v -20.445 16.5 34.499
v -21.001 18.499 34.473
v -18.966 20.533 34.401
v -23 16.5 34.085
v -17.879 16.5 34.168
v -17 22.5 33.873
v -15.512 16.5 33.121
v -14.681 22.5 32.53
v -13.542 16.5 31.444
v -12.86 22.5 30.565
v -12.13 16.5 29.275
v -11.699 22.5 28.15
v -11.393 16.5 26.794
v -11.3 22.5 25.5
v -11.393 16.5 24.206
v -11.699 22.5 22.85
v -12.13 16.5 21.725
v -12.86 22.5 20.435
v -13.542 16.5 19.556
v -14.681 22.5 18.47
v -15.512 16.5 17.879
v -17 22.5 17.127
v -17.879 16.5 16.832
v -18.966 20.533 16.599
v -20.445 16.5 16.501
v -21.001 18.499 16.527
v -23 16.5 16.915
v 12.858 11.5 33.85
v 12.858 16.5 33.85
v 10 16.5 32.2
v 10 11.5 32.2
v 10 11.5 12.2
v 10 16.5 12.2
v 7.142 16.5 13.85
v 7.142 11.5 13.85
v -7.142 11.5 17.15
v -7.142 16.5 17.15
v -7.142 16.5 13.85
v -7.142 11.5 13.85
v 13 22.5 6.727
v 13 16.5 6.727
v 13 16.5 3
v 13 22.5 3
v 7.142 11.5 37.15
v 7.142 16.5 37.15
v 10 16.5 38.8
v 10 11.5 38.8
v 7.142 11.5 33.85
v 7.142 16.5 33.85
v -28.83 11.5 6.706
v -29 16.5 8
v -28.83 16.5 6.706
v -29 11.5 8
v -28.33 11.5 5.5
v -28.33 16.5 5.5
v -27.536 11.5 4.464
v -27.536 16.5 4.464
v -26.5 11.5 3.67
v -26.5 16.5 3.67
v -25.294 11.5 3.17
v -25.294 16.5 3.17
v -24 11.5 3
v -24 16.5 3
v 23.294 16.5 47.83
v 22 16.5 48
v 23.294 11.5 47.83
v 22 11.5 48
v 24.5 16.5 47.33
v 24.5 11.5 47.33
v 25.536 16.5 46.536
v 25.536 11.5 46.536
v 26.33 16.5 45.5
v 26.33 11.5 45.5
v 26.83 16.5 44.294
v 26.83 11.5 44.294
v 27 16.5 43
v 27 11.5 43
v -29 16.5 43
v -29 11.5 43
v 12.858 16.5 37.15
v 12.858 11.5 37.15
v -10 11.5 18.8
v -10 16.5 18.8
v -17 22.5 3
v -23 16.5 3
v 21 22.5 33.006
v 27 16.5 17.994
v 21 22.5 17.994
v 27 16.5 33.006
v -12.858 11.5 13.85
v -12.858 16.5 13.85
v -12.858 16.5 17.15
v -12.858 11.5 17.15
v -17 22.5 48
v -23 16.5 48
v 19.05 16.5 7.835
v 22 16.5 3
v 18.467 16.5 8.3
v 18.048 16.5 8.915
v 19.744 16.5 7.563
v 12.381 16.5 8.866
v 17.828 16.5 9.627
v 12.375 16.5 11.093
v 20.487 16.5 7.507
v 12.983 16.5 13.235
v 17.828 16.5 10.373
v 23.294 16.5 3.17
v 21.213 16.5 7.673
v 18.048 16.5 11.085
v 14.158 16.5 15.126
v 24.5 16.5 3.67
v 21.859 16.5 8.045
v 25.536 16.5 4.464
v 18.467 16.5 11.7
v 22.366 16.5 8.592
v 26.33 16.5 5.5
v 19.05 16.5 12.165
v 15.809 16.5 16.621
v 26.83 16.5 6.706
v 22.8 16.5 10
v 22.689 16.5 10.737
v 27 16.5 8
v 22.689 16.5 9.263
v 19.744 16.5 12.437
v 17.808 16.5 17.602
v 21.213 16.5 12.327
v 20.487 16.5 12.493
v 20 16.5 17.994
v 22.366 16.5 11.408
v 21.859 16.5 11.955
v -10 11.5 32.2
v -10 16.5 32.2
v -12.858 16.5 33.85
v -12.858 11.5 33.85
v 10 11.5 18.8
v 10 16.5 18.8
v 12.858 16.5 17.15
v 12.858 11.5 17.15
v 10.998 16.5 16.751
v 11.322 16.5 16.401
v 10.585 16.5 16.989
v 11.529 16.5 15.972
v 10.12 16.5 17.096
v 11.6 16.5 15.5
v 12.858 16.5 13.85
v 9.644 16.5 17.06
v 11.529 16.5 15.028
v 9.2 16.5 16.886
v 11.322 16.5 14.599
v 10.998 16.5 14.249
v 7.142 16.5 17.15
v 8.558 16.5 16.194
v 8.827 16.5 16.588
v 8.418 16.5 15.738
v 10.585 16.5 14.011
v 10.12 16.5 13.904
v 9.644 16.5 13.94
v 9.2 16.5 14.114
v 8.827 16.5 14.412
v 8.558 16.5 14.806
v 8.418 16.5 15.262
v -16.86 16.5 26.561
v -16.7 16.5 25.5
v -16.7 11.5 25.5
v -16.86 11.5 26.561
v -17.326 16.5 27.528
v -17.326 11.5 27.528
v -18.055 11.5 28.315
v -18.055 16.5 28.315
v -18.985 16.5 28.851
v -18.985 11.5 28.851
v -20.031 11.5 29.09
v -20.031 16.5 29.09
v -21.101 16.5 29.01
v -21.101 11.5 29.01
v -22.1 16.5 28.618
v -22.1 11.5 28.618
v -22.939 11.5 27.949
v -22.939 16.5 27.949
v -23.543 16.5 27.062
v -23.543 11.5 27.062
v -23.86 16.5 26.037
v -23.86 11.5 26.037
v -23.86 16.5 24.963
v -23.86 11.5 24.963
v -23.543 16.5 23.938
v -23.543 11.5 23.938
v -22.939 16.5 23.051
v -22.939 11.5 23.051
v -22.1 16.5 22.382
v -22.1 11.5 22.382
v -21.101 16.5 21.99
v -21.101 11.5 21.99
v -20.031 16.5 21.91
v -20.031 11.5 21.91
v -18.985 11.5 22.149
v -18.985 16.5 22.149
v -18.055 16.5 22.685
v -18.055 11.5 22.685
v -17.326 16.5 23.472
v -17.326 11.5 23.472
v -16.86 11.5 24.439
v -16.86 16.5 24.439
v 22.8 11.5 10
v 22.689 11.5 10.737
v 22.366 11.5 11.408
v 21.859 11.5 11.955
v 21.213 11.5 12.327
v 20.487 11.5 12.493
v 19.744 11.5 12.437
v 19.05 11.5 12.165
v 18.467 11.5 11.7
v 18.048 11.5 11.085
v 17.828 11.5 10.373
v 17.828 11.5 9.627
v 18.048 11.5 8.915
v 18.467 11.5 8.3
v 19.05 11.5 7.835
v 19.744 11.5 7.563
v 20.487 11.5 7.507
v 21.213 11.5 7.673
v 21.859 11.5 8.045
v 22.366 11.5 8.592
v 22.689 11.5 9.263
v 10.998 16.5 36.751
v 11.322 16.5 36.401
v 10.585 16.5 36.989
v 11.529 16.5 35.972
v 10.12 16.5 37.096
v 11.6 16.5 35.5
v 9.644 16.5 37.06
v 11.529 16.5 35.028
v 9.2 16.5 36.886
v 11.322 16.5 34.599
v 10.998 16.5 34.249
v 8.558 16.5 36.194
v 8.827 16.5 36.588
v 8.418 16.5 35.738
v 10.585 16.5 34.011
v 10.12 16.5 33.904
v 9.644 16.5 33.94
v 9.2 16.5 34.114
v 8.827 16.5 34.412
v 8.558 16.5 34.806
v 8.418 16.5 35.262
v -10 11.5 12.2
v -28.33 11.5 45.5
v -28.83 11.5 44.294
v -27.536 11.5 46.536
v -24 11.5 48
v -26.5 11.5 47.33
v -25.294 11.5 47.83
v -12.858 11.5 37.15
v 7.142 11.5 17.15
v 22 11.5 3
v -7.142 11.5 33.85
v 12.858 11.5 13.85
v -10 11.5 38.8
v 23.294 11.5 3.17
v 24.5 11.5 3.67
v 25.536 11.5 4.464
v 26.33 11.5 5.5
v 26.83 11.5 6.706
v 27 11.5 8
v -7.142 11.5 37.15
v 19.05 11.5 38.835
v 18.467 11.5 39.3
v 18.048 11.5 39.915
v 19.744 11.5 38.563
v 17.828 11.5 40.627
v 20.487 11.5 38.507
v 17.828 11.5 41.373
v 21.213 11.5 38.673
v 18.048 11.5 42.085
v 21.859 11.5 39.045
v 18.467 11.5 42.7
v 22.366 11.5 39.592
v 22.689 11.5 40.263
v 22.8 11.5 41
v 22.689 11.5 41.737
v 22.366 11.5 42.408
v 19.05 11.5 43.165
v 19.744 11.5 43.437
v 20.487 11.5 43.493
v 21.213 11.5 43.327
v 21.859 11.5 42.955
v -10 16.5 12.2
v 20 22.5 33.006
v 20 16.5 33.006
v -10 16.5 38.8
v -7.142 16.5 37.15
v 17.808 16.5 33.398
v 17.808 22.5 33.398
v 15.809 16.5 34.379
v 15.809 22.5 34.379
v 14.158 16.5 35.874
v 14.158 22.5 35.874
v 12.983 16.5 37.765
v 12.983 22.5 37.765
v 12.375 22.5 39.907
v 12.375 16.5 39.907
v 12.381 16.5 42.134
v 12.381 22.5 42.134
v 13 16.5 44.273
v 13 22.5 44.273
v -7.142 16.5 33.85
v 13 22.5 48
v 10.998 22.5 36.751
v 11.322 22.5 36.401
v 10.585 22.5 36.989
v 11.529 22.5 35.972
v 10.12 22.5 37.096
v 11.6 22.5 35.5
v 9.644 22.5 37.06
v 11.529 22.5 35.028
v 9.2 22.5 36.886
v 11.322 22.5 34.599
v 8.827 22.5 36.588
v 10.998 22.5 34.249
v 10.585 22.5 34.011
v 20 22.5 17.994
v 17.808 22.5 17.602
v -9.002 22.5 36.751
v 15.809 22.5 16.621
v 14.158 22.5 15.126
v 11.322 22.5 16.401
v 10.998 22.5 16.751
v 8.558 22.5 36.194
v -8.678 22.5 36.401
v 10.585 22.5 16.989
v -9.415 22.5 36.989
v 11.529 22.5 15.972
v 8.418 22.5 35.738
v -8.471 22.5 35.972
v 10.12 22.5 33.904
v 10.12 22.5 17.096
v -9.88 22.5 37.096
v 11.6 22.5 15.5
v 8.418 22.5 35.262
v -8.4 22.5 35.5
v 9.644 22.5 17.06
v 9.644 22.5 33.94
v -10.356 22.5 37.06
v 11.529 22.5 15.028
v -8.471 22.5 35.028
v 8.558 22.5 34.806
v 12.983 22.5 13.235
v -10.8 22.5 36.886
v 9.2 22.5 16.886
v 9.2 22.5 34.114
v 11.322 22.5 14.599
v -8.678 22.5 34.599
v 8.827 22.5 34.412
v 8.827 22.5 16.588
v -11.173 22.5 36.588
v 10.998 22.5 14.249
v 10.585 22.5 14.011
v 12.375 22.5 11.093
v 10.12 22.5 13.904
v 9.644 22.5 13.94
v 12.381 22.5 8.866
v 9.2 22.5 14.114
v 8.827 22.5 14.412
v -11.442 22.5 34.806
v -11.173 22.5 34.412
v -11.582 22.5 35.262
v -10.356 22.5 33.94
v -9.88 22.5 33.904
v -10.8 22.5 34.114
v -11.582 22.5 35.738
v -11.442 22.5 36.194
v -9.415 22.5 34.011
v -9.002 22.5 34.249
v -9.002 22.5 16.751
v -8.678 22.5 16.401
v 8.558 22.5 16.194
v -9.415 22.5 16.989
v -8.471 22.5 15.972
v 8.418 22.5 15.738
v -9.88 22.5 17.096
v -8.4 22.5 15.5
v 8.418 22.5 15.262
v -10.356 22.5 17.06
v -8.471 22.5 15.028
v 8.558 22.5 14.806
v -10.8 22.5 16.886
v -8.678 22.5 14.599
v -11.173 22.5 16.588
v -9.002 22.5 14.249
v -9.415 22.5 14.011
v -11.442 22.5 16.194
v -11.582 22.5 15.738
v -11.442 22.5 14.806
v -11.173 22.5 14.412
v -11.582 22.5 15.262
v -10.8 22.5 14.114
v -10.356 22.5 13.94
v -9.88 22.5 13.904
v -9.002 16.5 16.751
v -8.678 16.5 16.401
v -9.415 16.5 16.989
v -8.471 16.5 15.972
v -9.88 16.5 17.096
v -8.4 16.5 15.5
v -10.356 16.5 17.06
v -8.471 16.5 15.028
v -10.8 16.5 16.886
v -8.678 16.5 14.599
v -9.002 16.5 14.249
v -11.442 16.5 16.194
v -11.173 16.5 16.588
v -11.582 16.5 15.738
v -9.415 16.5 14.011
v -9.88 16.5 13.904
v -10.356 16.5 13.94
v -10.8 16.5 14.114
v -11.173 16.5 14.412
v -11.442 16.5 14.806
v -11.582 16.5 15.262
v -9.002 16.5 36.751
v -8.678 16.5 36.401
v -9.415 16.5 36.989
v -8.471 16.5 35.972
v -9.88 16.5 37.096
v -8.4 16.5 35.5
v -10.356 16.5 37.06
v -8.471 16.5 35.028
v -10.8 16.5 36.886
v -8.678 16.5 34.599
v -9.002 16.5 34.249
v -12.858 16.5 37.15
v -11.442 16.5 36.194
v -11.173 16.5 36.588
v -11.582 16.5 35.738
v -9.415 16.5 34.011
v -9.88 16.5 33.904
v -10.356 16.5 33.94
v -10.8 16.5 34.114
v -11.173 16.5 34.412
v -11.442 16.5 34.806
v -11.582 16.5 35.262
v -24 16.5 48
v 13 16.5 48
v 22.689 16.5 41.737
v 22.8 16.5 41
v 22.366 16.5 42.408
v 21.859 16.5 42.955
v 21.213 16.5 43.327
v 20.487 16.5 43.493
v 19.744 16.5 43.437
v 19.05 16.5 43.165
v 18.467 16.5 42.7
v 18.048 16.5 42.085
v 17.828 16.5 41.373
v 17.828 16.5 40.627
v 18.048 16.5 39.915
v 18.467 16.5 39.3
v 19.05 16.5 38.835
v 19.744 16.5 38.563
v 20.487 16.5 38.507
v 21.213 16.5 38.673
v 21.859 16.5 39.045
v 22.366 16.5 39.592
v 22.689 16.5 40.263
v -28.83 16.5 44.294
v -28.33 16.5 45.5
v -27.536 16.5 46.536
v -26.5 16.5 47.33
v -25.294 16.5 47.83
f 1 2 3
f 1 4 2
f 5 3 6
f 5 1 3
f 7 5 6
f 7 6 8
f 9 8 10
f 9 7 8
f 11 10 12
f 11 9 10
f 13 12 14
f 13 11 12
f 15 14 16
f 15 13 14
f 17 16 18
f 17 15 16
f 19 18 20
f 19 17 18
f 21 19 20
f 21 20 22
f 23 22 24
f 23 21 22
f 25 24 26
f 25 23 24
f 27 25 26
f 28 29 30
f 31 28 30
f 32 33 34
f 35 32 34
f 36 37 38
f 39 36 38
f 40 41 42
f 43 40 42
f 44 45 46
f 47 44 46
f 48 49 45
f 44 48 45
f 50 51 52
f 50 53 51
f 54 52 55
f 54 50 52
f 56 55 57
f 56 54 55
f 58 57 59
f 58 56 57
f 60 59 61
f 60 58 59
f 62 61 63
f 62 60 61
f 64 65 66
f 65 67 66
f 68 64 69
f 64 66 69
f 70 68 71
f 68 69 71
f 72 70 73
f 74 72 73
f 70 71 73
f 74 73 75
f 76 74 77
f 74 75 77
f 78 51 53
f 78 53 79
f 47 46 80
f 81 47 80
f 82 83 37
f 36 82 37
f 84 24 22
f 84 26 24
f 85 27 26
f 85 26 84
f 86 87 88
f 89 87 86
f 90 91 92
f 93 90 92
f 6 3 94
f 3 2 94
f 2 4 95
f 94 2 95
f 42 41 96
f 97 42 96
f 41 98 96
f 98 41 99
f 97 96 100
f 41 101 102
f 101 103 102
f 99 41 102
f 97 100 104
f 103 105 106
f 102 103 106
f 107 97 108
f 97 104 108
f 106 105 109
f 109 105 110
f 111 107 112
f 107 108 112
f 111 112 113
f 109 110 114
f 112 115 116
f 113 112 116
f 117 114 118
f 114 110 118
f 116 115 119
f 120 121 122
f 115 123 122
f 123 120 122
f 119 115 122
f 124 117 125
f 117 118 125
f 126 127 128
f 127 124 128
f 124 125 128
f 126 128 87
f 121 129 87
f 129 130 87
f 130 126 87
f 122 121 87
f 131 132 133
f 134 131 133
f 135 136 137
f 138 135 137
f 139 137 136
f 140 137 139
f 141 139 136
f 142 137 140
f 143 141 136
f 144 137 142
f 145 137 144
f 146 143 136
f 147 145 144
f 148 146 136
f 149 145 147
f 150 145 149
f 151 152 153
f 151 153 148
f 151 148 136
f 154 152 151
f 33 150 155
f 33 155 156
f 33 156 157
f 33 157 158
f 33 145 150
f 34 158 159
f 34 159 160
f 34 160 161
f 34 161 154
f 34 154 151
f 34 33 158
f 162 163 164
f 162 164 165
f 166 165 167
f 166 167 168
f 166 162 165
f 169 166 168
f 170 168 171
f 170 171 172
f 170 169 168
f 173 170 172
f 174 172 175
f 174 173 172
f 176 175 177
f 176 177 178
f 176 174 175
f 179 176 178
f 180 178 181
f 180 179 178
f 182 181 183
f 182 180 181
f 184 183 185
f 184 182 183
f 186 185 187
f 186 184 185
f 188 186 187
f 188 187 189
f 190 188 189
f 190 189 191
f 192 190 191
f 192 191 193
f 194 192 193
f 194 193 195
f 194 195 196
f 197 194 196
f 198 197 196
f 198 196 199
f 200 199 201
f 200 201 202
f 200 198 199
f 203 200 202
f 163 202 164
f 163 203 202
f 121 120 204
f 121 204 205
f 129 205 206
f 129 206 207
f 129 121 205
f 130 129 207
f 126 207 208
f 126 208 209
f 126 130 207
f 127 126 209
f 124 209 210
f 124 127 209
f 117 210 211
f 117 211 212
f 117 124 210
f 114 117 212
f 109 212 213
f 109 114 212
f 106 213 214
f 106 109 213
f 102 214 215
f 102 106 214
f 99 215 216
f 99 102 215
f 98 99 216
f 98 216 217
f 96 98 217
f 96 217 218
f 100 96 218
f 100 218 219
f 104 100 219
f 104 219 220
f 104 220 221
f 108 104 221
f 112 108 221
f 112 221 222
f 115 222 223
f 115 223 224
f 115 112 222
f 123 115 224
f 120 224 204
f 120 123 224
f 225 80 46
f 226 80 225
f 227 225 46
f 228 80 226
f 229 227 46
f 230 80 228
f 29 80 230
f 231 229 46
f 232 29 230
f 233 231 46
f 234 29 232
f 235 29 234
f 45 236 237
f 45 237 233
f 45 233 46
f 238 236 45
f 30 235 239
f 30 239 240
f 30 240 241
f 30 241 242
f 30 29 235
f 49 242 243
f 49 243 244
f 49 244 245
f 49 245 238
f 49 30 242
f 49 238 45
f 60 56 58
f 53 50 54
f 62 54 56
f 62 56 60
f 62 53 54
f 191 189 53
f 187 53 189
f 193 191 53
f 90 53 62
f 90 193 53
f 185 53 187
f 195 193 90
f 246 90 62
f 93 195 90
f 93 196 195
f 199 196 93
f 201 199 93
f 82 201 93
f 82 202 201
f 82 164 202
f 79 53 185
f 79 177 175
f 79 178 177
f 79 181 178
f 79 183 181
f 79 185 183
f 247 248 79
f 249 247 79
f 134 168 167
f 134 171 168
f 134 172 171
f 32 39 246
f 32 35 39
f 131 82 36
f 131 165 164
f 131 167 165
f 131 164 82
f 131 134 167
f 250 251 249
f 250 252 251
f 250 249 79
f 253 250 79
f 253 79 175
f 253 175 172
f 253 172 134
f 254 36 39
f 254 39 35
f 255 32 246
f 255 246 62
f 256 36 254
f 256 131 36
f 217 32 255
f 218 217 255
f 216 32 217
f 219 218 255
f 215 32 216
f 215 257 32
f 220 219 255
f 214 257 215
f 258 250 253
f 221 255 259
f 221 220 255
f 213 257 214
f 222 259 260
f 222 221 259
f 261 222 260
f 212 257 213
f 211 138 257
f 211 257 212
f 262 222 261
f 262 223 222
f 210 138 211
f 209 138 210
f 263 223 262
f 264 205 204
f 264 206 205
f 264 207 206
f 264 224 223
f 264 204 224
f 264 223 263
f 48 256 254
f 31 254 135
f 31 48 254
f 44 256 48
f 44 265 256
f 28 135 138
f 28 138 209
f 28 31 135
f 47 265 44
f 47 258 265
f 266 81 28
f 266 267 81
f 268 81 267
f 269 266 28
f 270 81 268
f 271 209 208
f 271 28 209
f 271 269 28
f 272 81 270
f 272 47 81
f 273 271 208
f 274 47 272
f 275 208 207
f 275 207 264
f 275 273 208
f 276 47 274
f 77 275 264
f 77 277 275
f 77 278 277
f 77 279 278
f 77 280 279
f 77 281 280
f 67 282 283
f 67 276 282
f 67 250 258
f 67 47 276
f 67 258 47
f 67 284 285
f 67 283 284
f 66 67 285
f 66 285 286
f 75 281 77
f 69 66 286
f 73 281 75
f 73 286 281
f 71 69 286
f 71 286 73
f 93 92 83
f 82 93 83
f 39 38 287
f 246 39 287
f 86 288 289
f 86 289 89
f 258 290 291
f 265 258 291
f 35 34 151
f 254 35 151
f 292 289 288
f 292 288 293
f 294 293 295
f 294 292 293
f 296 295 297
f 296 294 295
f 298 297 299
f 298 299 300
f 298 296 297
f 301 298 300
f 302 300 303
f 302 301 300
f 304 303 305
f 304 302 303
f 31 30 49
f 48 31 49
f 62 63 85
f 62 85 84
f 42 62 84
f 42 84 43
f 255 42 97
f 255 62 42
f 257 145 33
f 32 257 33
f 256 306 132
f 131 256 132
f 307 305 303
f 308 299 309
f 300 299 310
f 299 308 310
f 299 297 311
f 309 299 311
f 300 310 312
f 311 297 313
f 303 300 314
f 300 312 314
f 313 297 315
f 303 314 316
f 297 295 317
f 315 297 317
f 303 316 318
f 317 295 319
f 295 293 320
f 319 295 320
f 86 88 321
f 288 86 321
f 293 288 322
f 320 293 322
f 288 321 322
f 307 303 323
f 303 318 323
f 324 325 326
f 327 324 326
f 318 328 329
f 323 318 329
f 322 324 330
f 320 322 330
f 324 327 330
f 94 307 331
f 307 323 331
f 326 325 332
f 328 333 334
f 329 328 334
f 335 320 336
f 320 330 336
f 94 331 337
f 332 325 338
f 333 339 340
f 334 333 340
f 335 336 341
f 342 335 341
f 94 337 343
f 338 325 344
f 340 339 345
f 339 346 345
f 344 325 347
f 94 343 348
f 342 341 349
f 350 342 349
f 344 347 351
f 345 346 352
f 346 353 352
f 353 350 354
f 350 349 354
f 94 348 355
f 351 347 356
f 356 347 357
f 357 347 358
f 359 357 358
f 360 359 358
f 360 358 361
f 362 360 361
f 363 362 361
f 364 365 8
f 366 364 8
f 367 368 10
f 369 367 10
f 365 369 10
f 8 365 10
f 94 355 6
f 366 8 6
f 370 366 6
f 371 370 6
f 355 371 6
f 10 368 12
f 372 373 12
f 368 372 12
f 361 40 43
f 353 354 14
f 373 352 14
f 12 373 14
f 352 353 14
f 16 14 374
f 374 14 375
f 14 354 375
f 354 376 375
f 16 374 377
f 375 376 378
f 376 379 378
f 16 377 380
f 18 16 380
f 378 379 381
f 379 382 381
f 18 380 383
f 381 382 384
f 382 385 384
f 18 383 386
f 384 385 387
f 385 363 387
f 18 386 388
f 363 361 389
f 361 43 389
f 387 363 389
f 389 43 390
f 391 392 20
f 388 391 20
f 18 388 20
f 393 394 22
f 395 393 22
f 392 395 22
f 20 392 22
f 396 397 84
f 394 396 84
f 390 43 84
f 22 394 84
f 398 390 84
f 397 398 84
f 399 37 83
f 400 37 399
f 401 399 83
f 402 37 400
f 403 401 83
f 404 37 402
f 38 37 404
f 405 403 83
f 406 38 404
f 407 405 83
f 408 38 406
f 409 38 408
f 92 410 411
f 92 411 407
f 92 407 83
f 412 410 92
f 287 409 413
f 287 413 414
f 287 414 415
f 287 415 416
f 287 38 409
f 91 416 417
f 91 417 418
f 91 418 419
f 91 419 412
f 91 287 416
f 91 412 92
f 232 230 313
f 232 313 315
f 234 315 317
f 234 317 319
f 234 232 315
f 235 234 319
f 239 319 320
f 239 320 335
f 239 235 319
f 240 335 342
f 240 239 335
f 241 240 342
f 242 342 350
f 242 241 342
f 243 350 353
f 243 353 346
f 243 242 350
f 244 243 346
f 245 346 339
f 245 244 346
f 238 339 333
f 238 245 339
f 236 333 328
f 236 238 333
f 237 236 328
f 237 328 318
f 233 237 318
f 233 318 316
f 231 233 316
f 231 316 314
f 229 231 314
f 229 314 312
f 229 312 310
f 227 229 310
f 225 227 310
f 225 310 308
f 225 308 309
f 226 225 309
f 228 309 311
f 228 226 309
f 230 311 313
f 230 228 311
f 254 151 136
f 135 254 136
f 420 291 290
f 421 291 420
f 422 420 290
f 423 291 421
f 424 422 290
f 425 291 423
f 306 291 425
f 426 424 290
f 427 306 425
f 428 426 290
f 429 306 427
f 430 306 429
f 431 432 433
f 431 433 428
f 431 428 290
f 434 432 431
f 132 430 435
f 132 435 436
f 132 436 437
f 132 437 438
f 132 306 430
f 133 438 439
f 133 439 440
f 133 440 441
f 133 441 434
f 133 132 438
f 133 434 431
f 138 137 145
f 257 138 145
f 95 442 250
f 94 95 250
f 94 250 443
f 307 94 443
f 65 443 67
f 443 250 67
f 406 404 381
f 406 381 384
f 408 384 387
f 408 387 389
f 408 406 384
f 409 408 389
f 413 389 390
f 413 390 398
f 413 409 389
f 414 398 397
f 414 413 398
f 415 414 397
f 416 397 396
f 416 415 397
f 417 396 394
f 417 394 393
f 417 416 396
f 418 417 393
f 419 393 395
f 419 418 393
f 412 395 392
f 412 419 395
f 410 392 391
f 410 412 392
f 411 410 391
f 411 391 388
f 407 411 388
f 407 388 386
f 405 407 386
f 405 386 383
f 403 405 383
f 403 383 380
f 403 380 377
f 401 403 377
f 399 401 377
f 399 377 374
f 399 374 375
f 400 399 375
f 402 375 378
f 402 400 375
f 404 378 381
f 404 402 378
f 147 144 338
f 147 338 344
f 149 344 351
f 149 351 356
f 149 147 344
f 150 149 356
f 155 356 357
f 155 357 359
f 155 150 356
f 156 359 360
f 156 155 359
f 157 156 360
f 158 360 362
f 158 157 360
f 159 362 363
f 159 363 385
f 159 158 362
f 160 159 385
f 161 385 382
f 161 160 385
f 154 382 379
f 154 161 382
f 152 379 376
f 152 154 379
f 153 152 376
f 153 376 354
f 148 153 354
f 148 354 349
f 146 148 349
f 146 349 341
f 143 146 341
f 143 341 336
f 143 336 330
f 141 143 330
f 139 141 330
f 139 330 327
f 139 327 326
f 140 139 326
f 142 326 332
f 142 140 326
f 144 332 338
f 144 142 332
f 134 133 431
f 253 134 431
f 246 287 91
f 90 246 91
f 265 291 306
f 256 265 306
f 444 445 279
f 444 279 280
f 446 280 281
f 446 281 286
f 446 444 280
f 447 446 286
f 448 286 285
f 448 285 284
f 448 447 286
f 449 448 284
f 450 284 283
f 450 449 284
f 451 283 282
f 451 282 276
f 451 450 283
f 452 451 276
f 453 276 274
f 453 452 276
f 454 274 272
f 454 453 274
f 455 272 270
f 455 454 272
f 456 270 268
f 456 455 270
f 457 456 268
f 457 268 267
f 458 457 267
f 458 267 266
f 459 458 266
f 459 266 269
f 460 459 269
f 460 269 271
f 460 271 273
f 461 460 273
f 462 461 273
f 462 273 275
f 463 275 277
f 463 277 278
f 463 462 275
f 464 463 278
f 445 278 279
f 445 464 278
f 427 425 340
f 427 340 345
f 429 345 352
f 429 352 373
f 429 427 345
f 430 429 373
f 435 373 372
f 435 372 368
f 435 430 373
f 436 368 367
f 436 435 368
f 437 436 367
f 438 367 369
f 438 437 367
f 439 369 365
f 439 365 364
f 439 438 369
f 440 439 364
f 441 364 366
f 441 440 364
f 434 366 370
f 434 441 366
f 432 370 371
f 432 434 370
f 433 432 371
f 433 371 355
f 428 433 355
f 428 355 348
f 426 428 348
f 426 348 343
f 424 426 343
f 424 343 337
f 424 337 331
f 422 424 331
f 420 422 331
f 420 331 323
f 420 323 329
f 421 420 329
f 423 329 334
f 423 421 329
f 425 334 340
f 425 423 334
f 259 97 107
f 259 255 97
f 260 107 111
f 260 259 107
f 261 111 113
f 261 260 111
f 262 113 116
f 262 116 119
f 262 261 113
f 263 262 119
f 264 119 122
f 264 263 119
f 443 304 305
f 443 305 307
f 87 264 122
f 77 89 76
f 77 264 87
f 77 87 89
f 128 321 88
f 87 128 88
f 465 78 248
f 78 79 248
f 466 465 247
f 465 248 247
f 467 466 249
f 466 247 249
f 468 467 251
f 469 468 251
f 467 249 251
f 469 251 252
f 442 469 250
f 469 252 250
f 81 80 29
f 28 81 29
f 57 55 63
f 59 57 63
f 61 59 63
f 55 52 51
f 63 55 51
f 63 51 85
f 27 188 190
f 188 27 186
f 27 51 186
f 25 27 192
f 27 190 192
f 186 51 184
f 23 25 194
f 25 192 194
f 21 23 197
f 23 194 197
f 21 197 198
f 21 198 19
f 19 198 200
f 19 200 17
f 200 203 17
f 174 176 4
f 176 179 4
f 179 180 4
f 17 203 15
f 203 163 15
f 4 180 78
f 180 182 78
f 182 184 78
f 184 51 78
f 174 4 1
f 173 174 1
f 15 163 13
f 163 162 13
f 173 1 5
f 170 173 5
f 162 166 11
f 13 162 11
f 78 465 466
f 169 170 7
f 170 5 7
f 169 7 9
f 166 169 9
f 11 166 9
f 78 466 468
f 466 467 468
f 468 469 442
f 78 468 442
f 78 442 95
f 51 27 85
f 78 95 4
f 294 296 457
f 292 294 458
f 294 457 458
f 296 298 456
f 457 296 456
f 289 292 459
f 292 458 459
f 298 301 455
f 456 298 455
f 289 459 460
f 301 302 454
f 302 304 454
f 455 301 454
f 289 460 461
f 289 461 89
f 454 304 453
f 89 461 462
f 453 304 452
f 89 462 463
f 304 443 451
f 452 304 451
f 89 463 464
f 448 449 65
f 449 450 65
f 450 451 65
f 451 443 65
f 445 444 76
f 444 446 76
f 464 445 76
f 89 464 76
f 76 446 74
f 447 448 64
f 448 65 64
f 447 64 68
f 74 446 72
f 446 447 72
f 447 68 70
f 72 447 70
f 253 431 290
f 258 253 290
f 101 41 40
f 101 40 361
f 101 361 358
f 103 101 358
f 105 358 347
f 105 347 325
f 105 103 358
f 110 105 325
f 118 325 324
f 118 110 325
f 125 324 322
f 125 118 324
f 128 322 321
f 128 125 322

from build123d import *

# Parameters (mm, degrees)
SKETCH050_W     = 56
SKETCH050_H     = 45
SKETCH050_R     = 2.5
SKETCH050_R_2   = 3.6
PAD021_DEPTH    = 5
FILLET004_R     = 5
POCKET019_DEPTH = 5
SKETCH051_R     = 1.6
PAD022_DEPTH    = 6
CHAMFER013_SIZE = 5.9999


with BuildPart() as part:
    # Sketch050 → Pad021 (new body)
    with BuildSketch(Plane.XZ):
        with Locations((-1, 25.5)):
            Rectangle(SKETCH050_W, SKETCH050_H)
        with Locations((20.3, 10)):
            Circle(SKETCH050_R, mode=Mode.SUBTRACT)
        with Locations((20.3, 41)):
            Circle(SKETCH050_R, mode=Mode.SUBTRACT)
        with Locations((-20.3, 25.5)):
            Circle(SKETCH050_R_2, mode=Mode.SUBTRACT)
    extrude(amount=PAD021_DEPTH)

    # Fillet004
    fillet004_edges = [part.edges().sort_by_distance(p)[0] for p in [
        (27, -2.5, 48),
        (27, -2.5, 3),
        (-29, -2.5, 3),
        (-29, -2.5, 48),
    ]]
    fillet(fillet004_edges, radius=FILLET004_R)

    # Sketch049 (on Face2 of Fillet004) → Pocket019 (cut)
    with BuildSketch(Plane(origin=(0, 0, 0), x_dir=(1, 0, 0), z_dir=(0, 1, 0))):
        Polygon((-7.142116, -17.15), (-7.142116, -13.85), (-10, -12.2), (-12.857884, -13.85), (-12.857884, -17.15), (-10, -18.8), align=None)
        Polygon((-7.142116, -33.85), (-10, -32.2), (-12.857884, -33.85), (-12.857884, -37.15), (-10, -38.8), (-7.142116, -37.15), align=None)
        Polygon((12.857884, -37.15), (12.857884, -33.85), (10, -32.2), (7.142116, -33.85), (7.142116, -37.15), (10, -38.8), align=None)
        Polygon((12.857884, -17.15), (12.857884, -13.85), (10, -12.2), (7.142116, -13.85), (7.142116, -17.15), (10, -18.8), align=None)
    extrude(amount=-POCKET019_DEPTH, mode=Mode.SUBTRACT)

    # Sketch051 (on Face2 of Pocket019) → Pad022 (join)
    with BuildSketch(Plane(origin=(0, 0, 0), x_dir=(1, 0, 0), z_dir=(0, 1, 0))):
        with BuildLine():
            ThreePointArc((13, -6.727386), (13.504689, -14.221819), (20, -17.994373))
            Line((20, -17.994373), (27, -17.994373))
            Line((27, -17.994373), (27, -33.005627))
            Line((20, -33.005627), (27, -33.005627))
            ThreePointArc((20, -33.005627), (13.504689, -36.778181), (13, -44.272614))
            Line((13, -44.272614), (13, -48))
            Line((-17, -48), (13, -48))
            Line((-17, -33.873171), (-17, -48))
            ThreePointArc((-17, -33.873171), (-11.3, -25.5), (-17, -17.126829))
            Line((-17, -17.126829), (-17, -3))
            Line((-17, -3), (13, -3))
            Line((13, -6.727386), (13, -3))
        make_face()
        with Locations((-10, -15.5)):
            Circle(SKETCH051_R, mode=Mode.SUBTRACT)
        with Locations((10, -15.5)):
            Circle(SKETCH051_R, mode=Mode.SUBTRACT)
        with Locations((10, -35.5)):
            Circle(SKETCH051_R, mode=Mode.SUBTRACT)
        with Locations((-10, -35.5)):
            Circle(SKETCH051_R, mode=Mode.SUBTRACT)
    extrude(amount=PAD022_DEPTH)

    # Chamfer013
    chamfer013_edges = [part.edges().sort_by_distance(p)[0] for p in [
        (-17, 0, 40.936586),
        (-17, 0, 10.063414),
        (27, 6, 25.5),
    ]]
    chamfer(chamfer013_edges, length=CHAMFER013_SIZE)


with BuildPart() as part_1:
    # Body010 placement: moved
    add(part.part.moved(Location((0, 16.5, 0))))


solid = part_1.part
